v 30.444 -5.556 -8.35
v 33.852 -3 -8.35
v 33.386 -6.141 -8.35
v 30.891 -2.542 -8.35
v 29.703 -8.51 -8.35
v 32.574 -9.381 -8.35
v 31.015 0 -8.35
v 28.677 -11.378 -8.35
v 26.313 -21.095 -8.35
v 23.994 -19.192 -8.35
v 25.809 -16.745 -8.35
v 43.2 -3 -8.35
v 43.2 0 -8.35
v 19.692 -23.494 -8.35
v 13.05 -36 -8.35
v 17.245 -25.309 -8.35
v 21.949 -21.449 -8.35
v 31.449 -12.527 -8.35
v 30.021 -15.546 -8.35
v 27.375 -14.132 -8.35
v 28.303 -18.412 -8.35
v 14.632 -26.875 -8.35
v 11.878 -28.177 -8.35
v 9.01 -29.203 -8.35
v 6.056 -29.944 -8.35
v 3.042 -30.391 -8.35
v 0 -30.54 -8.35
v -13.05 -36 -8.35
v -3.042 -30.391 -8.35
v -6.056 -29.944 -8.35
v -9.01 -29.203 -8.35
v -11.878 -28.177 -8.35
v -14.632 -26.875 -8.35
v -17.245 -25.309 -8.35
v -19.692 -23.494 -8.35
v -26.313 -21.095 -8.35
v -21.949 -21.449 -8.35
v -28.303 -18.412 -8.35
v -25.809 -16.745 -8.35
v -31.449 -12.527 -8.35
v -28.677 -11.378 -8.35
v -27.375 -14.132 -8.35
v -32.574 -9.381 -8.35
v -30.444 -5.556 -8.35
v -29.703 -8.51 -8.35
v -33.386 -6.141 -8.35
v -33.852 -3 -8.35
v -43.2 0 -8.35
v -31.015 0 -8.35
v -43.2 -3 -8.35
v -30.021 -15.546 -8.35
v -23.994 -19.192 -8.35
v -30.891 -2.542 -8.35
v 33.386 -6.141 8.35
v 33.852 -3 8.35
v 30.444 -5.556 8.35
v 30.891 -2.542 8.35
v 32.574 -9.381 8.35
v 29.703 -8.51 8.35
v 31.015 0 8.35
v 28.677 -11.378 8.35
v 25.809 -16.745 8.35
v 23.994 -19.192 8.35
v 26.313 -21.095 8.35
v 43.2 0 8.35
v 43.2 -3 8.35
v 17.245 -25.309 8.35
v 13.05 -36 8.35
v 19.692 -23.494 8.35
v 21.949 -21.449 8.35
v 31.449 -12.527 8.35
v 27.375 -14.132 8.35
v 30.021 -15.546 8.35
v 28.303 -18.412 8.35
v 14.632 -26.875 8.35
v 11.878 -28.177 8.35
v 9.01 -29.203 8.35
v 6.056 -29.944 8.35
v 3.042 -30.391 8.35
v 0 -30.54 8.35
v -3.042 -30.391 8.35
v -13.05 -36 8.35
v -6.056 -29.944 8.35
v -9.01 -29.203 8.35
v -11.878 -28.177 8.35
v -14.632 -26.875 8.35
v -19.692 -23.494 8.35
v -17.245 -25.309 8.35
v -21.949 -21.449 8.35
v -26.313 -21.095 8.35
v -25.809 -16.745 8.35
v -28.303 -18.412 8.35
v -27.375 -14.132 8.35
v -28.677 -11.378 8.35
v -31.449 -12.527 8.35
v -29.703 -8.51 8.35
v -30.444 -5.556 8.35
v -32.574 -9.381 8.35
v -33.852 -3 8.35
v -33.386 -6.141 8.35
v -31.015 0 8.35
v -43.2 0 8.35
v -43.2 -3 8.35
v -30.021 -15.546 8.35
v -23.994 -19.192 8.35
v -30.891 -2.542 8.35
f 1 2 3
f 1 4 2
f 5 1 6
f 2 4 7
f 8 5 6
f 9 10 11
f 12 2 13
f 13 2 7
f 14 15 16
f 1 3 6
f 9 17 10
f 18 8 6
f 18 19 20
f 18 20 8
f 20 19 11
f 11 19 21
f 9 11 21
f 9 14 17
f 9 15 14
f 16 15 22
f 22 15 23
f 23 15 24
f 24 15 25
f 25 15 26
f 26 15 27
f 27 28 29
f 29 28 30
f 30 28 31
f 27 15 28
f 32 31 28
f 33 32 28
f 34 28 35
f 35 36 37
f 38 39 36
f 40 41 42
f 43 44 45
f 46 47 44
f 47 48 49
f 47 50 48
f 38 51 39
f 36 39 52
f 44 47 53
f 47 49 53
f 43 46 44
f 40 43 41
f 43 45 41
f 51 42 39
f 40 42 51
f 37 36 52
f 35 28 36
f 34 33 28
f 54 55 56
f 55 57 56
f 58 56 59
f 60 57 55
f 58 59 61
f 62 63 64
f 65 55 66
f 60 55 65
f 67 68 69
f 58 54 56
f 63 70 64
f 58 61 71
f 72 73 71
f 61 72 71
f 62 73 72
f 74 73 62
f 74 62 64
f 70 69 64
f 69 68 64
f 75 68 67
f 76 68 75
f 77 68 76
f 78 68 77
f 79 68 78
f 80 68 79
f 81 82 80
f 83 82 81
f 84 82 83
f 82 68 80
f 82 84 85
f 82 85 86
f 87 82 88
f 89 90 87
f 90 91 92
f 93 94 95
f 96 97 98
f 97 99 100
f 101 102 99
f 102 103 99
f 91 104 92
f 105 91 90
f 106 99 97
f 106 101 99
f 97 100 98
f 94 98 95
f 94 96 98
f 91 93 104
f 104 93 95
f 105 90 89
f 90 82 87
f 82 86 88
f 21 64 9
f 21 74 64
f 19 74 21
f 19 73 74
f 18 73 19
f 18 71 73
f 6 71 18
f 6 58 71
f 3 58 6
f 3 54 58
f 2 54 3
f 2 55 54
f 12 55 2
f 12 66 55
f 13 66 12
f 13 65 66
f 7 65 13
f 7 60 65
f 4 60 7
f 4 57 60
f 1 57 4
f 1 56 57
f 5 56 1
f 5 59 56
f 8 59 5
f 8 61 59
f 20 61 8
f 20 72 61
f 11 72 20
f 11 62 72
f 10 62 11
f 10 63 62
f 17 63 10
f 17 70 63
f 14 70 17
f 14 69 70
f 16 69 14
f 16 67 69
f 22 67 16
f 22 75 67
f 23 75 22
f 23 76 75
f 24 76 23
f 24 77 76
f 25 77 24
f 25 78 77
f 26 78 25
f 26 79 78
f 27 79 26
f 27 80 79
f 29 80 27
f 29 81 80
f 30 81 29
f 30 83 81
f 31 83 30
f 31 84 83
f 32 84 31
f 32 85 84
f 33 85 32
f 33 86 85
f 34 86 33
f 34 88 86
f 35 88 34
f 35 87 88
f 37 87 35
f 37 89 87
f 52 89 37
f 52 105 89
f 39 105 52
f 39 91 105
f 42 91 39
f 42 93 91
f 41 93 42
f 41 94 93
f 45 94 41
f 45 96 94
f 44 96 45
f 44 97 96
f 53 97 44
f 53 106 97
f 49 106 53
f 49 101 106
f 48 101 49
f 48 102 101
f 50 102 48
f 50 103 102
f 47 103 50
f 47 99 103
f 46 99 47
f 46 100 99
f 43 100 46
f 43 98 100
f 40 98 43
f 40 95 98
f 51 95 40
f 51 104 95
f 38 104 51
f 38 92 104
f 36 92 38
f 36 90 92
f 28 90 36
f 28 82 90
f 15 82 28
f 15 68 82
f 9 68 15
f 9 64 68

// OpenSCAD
// file: clamp.scad
// Flange Clamp for the Blue Robotics Watertight Enclosure
//
// This document is a parametric design that does not include dimensions.
// Please use one of the accompanying files, e.g., enclosure-clamp-3in.scad.
//
// Based on the WTE3-M-CLAMP-R1 model by Blue Robotics:
// https://bluerobotics.com/store/watertight-enclosures/enclosure-clamp/
//
// OpenSCAD model by Ryan Govostes.
// License: CC BY 4.0 (https://creativecommons.org/licenses/by/4.0/)


fillet_radius = 1.00;


$fn = 64;


translate([0, 0, -(height/2)])
linear_extrude(height) {
    difference() {
        union() {
            hull() {
                translate([0, circle_y_offset])
                circle(r=(radius + thickness));

                translate([-(base_width/2), -depth])
                square(size=[base_width, 1]);
            }

            translate([-(width/2), -thickness])
            square([width, thickness]);
        }

        translate([0, circle_y_offset])
        circle(r=radius);

        // Cut off the top half of the shape
        translate([-200, 0])
        square([400, 400]);
    }
}

// TODO: Flange fillets
// TODO: Mounting and flange holes
// main file
// Flange Clamp for the Blue Robotics Watertight Enclosure, 2" (50mm) series
//
// Based on the WTE2_CLAMP_BR-102474_PUBLIC model by Blue Robotics:
// https://bluerobotics.com/store/watertight-enclosures/enclosure-clamp/
//
// OpenSCAD model by Ryan Govostes.
// License: CC BY 4.0 (https://creativecommons.org/licenses/by/4.0/)

// Note: The 2" series clamp is of slightly different design than the 3" and 4"
// series, featuring a wider 4.5mm diameter hole on one flange, and more
// fillets. These features are not reproduced on this model.


radius = 31.04;  // Tube OD - aluminum: 58.0 +/- 0.2mm, acrylic: 58.0 +/- 0.5mm
thickness = 3.00;

width = 86.40;
depth = 36.00;
height = 16.70;

base_width = 26.10;
base_hole_diameter = 3.30;  // M4x10
base_hole_depth = 4.50;

flange_hole_diameter = 3.30;  // M4x10


// The circle is centered 0.50 mm above the X axis. This detail is not
// captured in the mechanical drawing but has been confirmed by Blue Robotics:
//
// https://discuss.bluerobotics.com/t/small-offset-in-mounting-clamp/15944/2
circle_y_offset = 0.50;


include <clamp.scad>;
